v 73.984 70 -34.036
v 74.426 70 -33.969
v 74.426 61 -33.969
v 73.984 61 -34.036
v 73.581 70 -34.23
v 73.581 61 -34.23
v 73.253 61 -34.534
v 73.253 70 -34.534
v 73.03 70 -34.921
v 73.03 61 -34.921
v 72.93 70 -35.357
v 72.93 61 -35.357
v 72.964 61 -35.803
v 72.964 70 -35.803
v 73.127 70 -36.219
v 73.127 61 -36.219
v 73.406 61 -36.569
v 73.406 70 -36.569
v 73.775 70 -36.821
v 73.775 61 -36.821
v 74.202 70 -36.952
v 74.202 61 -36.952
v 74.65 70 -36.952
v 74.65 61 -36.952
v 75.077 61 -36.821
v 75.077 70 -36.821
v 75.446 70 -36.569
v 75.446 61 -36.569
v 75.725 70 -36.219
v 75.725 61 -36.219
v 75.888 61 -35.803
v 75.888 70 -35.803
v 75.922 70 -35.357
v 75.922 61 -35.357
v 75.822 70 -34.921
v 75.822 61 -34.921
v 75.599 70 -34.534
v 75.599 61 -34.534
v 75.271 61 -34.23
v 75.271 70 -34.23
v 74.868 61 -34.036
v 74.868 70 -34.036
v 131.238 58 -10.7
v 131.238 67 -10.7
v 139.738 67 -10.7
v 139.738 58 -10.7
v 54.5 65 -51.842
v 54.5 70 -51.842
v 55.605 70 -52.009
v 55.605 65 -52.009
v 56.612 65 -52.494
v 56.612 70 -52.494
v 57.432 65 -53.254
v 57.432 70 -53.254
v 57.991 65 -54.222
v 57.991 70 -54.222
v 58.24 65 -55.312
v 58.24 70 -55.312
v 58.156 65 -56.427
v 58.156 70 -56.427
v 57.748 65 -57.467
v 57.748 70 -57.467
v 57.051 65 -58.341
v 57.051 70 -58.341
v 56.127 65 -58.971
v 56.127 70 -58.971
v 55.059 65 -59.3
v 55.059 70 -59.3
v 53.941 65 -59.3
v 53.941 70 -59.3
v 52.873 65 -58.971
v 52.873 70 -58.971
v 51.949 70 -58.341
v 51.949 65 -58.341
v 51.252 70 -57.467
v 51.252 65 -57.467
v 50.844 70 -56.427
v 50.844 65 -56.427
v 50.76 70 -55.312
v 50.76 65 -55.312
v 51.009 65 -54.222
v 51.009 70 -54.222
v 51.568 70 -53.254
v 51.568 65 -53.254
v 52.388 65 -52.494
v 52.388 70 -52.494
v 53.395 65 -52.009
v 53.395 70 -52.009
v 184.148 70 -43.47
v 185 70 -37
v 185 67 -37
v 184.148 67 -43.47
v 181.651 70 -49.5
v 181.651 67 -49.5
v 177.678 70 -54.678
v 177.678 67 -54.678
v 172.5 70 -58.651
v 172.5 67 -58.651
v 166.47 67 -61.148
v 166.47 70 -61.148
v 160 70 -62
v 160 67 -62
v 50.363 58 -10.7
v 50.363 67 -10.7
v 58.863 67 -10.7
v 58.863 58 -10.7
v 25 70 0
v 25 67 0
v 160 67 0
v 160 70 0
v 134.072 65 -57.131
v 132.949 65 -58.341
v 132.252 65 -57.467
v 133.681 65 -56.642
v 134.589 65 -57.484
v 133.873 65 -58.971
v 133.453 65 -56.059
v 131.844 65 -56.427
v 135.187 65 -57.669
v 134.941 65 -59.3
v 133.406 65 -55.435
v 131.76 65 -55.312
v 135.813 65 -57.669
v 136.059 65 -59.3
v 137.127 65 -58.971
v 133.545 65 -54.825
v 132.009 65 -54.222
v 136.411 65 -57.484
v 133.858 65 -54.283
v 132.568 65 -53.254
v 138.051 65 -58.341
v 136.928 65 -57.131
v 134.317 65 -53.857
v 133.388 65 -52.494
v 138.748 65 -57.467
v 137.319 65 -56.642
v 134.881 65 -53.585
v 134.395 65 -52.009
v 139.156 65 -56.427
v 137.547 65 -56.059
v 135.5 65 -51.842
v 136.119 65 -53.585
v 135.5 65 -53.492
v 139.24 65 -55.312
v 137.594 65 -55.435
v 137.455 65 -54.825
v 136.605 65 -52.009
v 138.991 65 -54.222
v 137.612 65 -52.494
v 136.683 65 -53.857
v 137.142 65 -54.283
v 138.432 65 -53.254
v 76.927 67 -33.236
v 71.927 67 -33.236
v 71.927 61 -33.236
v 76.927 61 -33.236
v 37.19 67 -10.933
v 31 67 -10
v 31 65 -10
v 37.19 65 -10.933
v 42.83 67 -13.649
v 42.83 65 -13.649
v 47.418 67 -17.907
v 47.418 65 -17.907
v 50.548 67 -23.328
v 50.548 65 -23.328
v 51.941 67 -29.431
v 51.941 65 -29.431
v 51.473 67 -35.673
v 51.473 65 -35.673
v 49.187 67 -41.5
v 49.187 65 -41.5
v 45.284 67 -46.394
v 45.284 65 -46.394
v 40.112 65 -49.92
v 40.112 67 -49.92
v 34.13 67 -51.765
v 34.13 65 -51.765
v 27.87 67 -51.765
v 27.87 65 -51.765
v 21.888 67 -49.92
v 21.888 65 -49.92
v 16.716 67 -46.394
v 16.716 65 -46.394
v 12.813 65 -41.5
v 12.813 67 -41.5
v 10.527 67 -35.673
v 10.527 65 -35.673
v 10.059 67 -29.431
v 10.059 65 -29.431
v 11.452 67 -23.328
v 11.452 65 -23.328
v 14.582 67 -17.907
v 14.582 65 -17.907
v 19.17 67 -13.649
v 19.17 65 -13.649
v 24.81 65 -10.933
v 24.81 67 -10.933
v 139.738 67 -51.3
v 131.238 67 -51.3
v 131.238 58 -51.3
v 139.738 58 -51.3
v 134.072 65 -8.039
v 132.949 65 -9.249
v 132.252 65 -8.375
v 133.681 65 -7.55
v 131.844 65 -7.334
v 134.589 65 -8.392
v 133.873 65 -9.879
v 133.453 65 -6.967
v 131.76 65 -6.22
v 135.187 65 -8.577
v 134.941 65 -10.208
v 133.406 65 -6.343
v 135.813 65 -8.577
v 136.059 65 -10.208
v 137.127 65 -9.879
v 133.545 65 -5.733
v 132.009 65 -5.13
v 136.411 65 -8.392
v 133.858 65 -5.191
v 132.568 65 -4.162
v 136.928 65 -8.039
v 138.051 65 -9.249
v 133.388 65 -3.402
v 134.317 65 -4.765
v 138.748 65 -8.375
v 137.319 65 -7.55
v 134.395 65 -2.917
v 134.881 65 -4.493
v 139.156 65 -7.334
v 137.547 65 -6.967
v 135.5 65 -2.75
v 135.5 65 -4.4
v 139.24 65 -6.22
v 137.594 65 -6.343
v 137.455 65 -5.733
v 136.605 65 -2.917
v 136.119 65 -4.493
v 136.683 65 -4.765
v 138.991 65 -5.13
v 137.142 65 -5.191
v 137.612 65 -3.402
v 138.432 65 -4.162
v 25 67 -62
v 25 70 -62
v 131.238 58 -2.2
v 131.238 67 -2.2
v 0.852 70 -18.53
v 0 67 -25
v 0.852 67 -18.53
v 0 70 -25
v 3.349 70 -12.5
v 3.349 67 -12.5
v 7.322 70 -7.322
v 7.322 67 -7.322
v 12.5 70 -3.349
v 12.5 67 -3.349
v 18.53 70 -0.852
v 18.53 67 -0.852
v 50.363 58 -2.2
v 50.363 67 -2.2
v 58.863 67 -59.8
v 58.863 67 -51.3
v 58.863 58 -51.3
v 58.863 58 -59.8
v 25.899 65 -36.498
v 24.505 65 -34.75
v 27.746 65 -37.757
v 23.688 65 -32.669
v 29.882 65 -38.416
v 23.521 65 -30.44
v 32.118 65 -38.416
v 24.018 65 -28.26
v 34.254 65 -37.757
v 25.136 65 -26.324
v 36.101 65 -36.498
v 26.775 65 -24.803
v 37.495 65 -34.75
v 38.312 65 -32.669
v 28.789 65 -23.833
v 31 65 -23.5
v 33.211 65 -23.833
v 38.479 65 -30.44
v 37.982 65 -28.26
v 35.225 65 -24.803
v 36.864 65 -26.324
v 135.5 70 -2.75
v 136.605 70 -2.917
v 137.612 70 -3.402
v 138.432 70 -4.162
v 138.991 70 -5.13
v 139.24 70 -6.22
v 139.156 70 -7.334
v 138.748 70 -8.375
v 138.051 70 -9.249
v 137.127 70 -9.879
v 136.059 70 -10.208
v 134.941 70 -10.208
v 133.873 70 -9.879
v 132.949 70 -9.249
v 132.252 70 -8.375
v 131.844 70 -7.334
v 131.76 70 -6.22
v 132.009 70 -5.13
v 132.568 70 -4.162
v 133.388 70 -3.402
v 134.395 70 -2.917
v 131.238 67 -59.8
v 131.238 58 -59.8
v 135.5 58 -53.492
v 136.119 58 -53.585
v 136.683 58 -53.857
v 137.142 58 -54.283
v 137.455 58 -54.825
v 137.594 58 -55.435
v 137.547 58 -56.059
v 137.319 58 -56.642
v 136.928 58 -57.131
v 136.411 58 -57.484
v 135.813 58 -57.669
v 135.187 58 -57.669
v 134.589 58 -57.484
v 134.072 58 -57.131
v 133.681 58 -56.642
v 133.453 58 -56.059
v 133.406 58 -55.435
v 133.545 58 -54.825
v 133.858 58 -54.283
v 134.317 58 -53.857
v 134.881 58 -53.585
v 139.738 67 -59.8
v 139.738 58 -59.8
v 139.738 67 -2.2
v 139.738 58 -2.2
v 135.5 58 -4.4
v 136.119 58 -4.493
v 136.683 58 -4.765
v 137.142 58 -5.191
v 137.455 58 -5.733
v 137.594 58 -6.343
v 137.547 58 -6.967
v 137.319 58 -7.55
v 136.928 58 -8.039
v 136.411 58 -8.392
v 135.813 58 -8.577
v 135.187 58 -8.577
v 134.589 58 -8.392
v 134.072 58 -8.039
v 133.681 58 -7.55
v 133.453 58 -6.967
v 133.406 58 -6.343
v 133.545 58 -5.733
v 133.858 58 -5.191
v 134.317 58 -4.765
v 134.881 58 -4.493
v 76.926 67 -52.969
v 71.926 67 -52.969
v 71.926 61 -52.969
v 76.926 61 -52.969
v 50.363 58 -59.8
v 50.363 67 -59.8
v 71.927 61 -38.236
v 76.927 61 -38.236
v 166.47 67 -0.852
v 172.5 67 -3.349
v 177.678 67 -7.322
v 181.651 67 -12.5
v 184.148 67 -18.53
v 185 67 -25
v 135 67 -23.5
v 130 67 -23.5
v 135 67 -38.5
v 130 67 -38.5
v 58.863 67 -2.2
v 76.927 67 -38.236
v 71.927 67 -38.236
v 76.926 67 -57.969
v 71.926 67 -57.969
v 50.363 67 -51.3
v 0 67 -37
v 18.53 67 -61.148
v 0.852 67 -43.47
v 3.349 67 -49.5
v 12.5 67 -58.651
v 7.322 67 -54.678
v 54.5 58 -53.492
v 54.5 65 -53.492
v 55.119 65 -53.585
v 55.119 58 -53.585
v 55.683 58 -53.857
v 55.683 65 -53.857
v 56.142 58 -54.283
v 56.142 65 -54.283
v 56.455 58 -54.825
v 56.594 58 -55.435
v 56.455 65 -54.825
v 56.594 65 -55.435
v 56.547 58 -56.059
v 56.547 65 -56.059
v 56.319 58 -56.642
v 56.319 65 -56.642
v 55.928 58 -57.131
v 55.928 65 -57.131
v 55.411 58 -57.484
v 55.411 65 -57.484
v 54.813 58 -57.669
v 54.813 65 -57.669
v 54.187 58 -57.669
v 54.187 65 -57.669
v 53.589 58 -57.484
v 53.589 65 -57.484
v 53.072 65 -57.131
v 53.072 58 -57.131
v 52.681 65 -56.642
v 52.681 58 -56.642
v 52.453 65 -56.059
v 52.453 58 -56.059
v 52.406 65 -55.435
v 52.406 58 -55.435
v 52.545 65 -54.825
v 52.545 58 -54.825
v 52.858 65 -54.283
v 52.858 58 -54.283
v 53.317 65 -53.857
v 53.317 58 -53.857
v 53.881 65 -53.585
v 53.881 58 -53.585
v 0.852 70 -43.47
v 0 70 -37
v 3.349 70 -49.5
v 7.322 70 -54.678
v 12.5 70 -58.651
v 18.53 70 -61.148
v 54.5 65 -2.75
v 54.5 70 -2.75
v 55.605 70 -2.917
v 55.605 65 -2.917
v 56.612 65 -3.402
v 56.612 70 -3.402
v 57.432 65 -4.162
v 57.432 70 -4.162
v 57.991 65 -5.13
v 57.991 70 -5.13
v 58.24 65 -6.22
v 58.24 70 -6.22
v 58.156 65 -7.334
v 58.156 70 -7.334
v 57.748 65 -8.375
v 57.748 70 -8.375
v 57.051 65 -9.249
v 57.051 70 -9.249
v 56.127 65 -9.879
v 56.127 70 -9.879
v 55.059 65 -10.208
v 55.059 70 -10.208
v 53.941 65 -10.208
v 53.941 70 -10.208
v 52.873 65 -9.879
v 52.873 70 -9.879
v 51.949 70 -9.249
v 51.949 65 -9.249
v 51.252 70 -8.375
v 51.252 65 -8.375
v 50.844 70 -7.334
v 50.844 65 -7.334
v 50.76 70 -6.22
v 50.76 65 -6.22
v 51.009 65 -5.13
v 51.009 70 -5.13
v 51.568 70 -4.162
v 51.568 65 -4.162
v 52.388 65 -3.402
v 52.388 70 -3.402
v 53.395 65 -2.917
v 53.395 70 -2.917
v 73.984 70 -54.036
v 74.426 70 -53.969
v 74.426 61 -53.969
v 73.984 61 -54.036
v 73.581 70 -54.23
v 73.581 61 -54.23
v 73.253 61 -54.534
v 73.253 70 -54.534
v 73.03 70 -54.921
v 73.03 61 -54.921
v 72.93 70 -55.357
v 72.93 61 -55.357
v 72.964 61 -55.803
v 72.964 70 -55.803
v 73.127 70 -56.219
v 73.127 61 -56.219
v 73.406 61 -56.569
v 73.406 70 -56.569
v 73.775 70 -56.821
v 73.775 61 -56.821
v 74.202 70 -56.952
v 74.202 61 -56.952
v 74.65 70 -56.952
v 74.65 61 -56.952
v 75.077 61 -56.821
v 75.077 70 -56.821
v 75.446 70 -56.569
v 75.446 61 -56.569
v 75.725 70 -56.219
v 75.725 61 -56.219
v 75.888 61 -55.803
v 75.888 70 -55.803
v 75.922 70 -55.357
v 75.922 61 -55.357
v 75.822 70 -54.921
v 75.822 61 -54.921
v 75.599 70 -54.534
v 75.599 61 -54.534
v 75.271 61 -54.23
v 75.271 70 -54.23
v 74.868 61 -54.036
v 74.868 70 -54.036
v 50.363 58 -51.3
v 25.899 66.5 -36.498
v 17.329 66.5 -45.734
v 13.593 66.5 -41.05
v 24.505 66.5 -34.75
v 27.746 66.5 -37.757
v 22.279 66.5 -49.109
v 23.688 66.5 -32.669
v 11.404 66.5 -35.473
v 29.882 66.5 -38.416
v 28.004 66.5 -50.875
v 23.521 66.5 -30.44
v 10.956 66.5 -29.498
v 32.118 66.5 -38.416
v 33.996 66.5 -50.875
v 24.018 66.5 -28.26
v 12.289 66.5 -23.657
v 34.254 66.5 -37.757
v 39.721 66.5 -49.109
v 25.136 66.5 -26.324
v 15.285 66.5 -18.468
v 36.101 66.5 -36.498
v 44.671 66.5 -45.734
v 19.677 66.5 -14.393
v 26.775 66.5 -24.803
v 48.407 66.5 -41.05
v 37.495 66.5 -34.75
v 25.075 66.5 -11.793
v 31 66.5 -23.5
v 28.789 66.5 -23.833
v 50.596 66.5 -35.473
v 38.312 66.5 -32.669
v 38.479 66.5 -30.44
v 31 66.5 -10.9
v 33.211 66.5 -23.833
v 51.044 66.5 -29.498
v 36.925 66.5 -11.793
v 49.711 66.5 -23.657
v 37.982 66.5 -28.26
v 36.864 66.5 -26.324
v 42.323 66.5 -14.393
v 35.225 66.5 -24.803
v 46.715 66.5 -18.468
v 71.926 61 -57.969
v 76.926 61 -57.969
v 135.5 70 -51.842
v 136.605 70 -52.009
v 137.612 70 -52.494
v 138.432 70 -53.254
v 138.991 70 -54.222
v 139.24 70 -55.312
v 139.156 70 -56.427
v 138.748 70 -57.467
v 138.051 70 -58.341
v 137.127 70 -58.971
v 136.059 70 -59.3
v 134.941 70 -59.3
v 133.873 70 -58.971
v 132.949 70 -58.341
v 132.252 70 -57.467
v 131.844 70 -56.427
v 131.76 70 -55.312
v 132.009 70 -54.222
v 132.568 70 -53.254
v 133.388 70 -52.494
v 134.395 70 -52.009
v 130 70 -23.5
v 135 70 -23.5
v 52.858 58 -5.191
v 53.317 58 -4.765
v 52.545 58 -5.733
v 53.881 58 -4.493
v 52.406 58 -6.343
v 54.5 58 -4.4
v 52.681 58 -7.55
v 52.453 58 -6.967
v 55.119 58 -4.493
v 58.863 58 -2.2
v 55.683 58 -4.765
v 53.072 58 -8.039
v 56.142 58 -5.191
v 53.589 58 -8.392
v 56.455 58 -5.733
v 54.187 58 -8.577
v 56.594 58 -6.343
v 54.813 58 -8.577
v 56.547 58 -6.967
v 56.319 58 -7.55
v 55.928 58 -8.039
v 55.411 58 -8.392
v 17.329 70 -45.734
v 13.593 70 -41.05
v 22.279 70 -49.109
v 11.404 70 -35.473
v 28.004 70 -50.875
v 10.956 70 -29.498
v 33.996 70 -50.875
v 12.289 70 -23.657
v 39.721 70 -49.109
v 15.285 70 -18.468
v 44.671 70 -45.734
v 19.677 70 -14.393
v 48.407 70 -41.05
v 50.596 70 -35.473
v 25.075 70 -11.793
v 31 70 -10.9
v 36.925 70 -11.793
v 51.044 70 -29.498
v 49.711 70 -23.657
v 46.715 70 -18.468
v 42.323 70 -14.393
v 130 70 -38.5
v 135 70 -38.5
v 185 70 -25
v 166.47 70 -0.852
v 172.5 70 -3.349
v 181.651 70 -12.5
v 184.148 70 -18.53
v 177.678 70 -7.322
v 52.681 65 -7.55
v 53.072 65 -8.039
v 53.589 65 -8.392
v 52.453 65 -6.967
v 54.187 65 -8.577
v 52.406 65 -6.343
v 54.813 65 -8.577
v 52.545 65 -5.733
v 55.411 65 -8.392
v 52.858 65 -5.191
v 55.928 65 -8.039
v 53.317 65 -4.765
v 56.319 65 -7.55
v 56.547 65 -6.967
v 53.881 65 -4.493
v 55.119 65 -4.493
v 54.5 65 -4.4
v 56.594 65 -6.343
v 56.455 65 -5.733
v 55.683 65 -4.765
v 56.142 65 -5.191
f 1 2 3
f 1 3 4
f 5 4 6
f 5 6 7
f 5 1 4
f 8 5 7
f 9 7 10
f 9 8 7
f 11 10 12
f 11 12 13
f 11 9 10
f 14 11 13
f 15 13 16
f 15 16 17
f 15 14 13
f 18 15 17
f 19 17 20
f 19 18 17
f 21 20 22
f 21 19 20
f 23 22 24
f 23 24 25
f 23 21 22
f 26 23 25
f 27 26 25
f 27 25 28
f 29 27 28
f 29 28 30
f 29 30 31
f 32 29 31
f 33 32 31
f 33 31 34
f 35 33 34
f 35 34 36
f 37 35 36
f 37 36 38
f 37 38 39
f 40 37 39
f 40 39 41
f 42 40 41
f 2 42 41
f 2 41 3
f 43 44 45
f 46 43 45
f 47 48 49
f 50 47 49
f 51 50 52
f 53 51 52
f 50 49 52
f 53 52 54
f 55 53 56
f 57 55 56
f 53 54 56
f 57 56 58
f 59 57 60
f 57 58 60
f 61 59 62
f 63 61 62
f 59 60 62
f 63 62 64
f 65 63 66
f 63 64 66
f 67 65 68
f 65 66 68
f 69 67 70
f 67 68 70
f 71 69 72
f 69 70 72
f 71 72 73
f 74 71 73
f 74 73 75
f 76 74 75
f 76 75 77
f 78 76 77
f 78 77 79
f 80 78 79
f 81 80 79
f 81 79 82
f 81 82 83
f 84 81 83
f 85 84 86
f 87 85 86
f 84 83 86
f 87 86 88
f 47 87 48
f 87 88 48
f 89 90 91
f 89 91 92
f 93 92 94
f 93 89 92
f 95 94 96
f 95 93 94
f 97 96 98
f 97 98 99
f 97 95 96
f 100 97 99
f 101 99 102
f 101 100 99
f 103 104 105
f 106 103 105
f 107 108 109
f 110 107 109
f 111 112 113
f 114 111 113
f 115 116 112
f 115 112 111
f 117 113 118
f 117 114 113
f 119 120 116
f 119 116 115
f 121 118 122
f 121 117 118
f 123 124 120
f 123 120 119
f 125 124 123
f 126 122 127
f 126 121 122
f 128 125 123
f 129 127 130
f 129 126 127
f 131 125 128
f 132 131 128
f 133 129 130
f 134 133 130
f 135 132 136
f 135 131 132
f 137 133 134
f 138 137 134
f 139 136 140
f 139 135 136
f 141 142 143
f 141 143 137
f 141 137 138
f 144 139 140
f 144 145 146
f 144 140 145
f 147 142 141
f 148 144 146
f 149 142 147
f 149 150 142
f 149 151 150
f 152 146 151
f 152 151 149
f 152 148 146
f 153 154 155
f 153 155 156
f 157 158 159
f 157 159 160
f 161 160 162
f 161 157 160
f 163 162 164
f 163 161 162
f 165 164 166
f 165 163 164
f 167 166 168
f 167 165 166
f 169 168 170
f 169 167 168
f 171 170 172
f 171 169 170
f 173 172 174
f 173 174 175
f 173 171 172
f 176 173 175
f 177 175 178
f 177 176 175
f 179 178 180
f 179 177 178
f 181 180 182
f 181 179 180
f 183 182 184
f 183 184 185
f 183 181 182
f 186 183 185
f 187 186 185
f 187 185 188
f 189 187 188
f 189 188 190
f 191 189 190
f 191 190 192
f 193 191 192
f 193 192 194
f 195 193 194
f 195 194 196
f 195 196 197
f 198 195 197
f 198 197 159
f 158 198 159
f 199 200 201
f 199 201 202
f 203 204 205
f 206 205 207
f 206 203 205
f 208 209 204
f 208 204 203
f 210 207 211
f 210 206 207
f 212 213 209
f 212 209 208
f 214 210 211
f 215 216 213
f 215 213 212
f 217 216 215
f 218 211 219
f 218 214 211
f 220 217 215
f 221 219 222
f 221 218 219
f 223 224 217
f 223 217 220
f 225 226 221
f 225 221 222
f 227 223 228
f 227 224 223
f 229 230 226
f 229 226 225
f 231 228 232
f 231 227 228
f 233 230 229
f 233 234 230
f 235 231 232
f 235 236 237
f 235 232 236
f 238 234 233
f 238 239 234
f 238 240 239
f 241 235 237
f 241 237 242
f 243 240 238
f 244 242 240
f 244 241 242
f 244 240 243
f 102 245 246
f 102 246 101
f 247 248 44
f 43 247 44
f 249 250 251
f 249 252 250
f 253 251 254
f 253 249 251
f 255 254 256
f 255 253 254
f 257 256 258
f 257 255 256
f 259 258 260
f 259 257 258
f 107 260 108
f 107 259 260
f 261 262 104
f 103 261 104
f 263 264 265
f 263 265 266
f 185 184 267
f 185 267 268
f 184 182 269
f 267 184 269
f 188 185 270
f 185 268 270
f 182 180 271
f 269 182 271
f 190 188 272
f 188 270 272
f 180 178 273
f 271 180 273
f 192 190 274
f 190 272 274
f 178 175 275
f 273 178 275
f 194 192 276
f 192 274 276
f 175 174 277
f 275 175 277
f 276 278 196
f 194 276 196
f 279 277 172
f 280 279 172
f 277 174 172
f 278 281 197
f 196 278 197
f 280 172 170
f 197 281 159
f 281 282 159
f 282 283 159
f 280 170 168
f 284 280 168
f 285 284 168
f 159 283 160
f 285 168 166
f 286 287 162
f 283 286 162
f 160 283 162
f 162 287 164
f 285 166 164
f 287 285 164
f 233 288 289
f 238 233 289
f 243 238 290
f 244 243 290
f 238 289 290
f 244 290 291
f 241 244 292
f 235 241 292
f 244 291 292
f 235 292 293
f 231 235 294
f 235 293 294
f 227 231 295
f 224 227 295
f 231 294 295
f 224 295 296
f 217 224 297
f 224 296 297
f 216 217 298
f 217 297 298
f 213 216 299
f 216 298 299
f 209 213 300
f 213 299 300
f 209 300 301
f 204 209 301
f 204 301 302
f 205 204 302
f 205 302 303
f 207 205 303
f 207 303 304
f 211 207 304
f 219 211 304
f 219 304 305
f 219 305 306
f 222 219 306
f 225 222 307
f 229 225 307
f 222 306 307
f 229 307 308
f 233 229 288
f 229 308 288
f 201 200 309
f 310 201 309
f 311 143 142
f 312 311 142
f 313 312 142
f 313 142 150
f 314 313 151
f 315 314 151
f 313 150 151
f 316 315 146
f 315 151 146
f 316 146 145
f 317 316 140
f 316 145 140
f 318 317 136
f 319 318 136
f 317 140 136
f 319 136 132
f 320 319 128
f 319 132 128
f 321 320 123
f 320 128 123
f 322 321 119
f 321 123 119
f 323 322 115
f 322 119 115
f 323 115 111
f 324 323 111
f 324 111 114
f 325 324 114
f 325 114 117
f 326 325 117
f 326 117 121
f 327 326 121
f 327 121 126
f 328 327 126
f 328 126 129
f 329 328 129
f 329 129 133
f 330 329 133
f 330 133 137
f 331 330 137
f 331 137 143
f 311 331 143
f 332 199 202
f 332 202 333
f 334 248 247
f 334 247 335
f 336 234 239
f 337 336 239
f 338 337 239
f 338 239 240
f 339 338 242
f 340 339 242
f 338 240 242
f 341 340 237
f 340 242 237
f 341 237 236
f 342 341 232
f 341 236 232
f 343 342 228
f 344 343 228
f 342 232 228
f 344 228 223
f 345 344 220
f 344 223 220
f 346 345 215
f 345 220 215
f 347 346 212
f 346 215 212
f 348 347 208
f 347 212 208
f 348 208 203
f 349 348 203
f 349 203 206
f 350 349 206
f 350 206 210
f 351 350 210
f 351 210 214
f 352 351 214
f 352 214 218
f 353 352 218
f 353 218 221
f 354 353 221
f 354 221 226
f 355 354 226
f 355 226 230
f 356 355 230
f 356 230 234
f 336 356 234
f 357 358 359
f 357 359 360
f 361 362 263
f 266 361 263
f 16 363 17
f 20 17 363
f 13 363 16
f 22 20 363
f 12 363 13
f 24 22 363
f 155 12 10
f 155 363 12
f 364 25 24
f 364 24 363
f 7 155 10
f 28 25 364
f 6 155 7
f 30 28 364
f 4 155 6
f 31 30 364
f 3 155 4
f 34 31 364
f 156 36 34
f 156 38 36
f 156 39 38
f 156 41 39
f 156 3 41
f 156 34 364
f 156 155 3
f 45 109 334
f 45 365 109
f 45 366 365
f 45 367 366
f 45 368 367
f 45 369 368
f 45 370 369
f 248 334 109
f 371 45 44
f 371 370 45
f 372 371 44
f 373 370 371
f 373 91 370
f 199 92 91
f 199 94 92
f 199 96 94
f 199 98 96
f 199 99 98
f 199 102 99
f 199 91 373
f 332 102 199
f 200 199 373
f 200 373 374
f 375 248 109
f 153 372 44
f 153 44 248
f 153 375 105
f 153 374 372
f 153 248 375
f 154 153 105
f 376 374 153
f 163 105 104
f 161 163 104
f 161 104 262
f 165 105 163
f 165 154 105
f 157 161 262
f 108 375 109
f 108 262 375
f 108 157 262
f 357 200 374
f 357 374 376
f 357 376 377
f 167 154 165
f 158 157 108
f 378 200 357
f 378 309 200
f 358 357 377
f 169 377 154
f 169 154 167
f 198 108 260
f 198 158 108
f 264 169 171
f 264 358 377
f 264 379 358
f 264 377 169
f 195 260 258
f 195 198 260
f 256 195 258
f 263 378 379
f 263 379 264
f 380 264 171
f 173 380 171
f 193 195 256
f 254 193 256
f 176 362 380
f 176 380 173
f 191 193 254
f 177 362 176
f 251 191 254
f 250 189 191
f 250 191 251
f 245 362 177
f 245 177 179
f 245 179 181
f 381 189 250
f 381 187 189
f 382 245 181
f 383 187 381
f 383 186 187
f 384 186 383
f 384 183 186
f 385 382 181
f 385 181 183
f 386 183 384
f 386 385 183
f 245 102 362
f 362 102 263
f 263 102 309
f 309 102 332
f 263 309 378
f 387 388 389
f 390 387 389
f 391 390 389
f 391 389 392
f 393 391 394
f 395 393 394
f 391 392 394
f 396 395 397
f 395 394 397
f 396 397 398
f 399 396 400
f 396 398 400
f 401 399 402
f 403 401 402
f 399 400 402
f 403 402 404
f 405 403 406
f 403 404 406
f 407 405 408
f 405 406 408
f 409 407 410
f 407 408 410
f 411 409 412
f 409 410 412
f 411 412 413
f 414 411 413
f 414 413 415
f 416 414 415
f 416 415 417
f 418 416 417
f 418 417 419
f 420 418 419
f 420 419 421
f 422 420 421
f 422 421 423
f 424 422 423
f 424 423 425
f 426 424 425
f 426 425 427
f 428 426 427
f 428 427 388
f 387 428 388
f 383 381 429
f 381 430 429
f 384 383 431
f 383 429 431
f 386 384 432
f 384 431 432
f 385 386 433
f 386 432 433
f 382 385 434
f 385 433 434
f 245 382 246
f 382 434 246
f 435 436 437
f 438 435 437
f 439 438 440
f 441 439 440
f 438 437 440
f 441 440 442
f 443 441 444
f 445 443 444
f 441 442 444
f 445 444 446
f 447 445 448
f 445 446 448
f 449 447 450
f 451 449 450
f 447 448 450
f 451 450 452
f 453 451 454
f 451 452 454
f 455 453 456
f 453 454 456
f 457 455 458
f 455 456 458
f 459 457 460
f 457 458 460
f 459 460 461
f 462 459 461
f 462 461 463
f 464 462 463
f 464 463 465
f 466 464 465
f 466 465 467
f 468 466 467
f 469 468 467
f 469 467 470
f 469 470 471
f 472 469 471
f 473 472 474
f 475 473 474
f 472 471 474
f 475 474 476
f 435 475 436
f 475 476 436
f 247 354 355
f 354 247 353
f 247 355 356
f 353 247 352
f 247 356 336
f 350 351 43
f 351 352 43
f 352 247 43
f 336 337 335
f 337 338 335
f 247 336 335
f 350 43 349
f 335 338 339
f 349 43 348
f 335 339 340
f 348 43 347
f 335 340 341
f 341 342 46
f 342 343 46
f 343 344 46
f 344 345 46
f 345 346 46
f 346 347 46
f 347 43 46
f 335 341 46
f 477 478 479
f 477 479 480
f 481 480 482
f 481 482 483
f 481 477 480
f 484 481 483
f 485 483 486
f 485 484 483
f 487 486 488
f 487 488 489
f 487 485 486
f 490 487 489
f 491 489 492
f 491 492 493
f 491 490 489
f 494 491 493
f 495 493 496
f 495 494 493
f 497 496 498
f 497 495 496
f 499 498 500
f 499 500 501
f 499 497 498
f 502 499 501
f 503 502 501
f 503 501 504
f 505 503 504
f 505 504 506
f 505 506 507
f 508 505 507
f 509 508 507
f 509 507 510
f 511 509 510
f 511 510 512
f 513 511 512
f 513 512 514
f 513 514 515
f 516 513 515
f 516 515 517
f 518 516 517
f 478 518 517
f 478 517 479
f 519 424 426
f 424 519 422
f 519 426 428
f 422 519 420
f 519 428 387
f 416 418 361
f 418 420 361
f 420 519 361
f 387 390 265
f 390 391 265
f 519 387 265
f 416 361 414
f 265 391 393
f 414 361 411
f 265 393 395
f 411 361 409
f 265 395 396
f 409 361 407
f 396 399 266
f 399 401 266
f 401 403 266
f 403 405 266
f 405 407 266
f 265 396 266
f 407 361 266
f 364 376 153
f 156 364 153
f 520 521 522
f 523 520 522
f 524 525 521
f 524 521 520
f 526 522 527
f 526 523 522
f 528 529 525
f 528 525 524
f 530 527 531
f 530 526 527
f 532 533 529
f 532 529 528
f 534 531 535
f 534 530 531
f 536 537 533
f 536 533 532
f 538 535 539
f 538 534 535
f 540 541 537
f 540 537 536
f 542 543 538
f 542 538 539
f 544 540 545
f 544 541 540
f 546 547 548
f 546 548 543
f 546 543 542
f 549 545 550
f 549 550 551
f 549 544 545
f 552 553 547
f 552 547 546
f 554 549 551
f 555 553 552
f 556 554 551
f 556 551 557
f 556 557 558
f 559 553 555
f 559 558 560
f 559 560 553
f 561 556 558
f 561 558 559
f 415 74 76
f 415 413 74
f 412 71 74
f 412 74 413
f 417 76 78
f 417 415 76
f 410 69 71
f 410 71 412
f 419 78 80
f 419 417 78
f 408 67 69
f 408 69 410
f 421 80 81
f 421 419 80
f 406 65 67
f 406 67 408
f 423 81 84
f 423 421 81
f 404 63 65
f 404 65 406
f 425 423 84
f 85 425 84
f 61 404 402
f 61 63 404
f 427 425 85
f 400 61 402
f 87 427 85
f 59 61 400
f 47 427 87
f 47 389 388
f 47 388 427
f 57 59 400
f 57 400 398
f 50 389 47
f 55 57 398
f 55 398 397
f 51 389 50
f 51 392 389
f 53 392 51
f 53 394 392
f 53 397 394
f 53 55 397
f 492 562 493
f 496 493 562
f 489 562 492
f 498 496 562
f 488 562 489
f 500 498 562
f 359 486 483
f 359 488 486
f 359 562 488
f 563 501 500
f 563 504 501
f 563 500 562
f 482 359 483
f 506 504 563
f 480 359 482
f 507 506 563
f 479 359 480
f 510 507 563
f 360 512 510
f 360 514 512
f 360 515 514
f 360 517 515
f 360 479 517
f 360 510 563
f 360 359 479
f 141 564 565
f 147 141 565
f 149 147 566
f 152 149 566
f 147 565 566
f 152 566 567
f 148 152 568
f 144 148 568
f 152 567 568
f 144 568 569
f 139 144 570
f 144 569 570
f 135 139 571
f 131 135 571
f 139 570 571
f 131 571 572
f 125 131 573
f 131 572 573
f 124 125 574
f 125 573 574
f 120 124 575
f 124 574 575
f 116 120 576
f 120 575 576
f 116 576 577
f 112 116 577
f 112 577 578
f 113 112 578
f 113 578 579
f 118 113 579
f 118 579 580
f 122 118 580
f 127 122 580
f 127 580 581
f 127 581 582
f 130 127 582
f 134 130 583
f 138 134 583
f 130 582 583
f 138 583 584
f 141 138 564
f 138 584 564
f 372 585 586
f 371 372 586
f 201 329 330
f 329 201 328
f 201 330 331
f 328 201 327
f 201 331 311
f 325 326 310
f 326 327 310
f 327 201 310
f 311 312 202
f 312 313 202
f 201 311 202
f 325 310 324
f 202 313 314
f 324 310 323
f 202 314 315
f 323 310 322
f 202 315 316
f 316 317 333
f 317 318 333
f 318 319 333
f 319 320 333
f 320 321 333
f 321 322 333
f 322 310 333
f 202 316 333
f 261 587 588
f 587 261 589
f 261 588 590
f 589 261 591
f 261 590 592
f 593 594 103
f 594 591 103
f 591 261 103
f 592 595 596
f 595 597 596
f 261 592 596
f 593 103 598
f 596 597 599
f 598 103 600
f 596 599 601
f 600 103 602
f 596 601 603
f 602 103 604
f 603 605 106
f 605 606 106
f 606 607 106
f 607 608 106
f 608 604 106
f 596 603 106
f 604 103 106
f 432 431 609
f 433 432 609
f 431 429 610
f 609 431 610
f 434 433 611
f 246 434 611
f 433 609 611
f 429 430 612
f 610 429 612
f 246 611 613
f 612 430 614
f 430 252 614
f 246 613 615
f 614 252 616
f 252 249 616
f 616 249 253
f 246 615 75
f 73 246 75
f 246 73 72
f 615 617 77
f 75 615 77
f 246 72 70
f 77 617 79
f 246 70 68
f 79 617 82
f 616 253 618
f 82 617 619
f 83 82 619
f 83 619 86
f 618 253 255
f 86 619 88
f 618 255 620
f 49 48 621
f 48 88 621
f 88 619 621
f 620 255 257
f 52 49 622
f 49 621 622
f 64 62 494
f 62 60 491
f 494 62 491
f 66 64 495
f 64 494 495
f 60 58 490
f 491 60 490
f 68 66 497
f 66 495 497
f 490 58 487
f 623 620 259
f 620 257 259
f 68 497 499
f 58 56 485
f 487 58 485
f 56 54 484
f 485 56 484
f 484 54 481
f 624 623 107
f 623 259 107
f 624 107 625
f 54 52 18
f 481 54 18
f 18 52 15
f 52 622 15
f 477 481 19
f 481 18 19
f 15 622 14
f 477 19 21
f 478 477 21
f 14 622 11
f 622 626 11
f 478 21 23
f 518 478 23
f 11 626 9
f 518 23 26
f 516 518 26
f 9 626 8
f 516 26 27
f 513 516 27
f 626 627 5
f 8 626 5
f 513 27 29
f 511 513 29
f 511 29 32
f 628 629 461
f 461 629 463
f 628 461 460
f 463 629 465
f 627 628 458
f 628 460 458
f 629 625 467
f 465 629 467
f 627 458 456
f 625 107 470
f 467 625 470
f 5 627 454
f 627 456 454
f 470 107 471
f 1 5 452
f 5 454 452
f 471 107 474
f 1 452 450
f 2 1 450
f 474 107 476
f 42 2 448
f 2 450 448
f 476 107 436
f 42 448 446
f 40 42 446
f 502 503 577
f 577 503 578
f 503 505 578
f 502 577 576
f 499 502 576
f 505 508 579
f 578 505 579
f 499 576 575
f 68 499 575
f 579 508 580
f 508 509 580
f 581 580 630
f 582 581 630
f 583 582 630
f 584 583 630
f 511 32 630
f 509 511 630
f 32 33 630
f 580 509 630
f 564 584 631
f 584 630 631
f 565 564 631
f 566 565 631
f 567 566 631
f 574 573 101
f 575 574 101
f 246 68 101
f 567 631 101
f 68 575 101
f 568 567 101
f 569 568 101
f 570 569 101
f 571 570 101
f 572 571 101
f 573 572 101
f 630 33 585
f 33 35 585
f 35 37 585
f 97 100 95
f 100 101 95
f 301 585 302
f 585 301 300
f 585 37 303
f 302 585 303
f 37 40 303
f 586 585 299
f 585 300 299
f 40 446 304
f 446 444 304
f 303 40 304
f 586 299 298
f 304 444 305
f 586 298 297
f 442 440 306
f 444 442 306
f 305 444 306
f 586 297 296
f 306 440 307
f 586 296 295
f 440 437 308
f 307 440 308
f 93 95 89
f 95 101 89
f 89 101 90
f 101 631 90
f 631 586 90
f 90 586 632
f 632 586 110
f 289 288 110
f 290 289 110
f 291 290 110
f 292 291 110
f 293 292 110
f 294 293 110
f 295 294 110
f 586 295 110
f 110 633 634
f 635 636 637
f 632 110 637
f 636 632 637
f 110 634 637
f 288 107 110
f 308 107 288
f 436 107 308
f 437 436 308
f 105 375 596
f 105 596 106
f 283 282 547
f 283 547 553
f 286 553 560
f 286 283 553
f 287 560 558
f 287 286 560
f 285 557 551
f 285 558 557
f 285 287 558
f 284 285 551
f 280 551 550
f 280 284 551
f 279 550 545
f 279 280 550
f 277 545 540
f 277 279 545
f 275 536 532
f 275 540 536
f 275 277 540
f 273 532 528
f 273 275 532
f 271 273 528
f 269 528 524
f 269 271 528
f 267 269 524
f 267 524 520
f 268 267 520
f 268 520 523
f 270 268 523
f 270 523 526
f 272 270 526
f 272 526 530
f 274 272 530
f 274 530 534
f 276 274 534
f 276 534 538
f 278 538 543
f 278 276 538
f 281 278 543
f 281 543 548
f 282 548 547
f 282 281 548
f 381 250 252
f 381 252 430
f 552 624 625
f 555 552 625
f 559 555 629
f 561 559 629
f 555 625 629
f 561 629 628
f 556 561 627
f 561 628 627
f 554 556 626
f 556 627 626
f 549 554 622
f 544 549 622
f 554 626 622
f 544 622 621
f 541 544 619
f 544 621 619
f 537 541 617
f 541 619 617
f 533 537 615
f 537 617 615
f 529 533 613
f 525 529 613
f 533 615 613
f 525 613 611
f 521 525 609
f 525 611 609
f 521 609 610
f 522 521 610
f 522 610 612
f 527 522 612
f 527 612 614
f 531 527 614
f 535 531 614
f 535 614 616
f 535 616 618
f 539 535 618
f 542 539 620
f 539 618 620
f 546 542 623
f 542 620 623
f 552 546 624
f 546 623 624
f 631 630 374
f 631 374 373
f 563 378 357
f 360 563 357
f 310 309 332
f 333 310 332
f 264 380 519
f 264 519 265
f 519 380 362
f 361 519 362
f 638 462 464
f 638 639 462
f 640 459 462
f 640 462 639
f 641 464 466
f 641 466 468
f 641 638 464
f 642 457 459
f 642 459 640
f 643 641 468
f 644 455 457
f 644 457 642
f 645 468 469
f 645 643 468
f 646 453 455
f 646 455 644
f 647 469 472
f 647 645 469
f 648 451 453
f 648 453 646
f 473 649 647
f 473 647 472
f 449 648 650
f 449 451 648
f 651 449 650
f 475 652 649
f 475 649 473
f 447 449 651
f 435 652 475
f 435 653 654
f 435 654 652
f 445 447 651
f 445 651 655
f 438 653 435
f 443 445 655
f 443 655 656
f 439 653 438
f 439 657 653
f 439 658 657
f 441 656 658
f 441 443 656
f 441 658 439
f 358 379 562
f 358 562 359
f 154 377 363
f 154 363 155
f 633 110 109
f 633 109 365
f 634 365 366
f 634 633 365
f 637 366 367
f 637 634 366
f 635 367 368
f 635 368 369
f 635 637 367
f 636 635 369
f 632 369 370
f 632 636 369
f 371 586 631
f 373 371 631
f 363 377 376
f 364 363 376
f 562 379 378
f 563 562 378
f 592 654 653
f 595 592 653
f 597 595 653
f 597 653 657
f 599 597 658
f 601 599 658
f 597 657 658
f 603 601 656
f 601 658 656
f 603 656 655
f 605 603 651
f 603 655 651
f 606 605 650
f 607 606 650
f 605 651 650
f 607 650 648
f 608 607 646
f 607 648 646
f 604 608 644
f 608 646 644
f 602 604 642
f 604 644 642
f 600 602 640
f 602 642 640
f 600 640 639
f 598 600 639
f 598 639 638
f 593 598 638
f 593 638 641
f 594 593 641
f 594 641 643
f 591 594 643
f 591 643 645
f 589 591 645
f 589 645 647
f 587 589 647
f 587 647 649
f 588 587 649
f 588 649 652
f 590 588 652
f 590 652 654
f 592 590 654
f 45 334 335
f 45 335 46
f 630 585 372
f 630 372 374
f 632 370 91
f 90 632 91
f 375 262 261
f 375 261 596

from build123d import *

# Parameters (mm, degrees)
SKETCH1_W                = 185
SKETCH1_H                = 62
BOSS_EXTRUDE1_DEPTH      = 70
FILLET1_R                = 25
CUT_EXTRUDE6_DEPTH       = 64
SKETCH11_R               = 25
CUT_EXTRUDE9_DEPTH       = 17
SKETCH16_R               = 21
BOSS_EXTRUDE6_DEPTH      = 5
SKETCH17_R               = 20.1
CUT_EXTRUDE12_DEPTH      = 3.5
SKETCH20_R               = 25
CUT_EXTRUDE14_DEPTH      = 5.5
SKETCH25_W               = 40
SKETCH25_H               = 8
CUT_EXTRUDE16_DEPTH      = 14
CUT_EXTRUDE21_DEPTH      = 0.1
SKETCH28_R               = 25
BOSS_EXTRUDE10_DEPTH     = 1
SKETCH29_W               = 5
SKETCH29_H               = 15
CUT_EXTRUDE22_DEPTH      = 5
CUT_EXTRUDE24_DEPTH      = 73
CUT_EXTRUDE24_DEPTH_BACK = 44
SKETCH28_2_R             = 25
SKETCH33_OUTSIDE_W       = 226.368
SKETCH33_OUTSIDE_H       = 103.368
CUT_EXTRUDE25_DEPTH      = 23
SKETCH35_W               = 8.5
SKETCH35_H               = 8.5
SKETCH35_R               = 3.75
SKETCH35_R_2             = 2.1
BOSS_EXTRUDE16_DEPTH     = 12
CUT_EXTRUDE13_DEPTH      = 196.481456921
CUT_EXTRUDE13_DEPTH_BACK = 196.481456921
SKETCH18_R               = 7.5
SKETCH35_5_R             = 3.75
SKETCH35_5_R_2           = 2.1
CUT_EXTRUDE36_DEPTH      = 5
CUT_EXTRUDE37_DEPTH      = 196.481456921
CUT_EXTRUDE37_DEPTH_BACK = 196.481456921
SKETCH35_6_R             = 2.1
SKETCH36_W               = 5
SKETCH36_H               = 5
SKETCH36_R               = 1.5
BOSS_EXTRUDE17_DEPTH     = 9
SKETCH36_5_R             = 1.5
CUT_EXTRUDE38_DEPTH      = 9


with BuildPart() as part:
    # Sketch1 → Boss-Extrude1 (new body)
    with BuildSketch(Plane(origin=(0, 0, 0), x_dir=(1, 0, 0), z_dir=(0, 1, 0))):
        with Locations((92.5, 31)):
            Rectangle(SKETCH1_W, SKETCH1_H)
    extrude(amount=BOSS_EXTRUDE1_DEPTH)

    # Fillet1
    fillet1_edges = [part.edges().sort_by_distance(p)[0] for p in [
        (0, 35, -62),
        (185, 35, -62),
        (185, 35, 0),
        (0, 35, 0),
    ]]
    fillet(fillet1_edges, radius=FILLET1_R)

    # Sketch7 → Cut-Extrude6 (cut)
    with BuildSketch(Plane(origin=(0, 67, 0), x_dir=(1, 0, 0), z_dir=(0, 1, 0))):
        with BuildLine():
            Line((25, 58), (160, 58))
            ThreePointArc((160, 58), (174.849242405, 51.849242405), (181, 37))
            Line((181, 37), (181, 25))
            ThreePointArc((181, 25), (174.849242405, 10.150757595), (160, 4))
            Line((160, 4), (25, 4))
            ThreePointArc((25, 4), (10.150757595, 10.150757595), (4, 25))
            Line((4, 25), (4, 37))
            ThreePointArc((4, 37), (10.150757595, 51.849242405), (25, 58))
        make_face()
    extrude(amount=-CUT_EXTRUDE6_DEPTH, mode=Mode.SUBTRACT)

    # Sketch11 → Cut-Extrude9 (cut)
    with BuildSketch(Plane.XZ):
        with Locations(Location((154, -31, 0), (0, 0, 270))):
            Circle(SKETCH11_R)
    extrude(amount=-CUT_EXTRUDE9_DEPTH, mode=Mode.SUBTRACT)

    # Sketch16 → Boss-Extrude6 (add)
    with BuildSketch(Plane(origin=(0, 70, 0), x_dir=(1, 0, 0), z_dir=(0, 1, 0))):
        with Locations(Location((31, 31, 0), (0, 0, 270))):
            Circle(SKETCH16_R)
    extrude(amount=-BOSS_EXTRUDE6_DEPTH)

    # Sketch17 → Cut-Extrude12 (cut)
    with BuildSketch(Plane(origin=(0, 70, 0), x_dir=(1, 0, 0), z_dir=(0, 1, 0))):
        with Locations(Location((31, 31, 0), (0, 0, 270))):
            Circle(SKETCH17_R)
    extrude(amount=-CUT_EXTRUDE12_DEPTH, mode=Mode.SUBTRACT)

    # Sketch20 → Cut-Extrude14 (cut)
    with BuildSketch(Plane.XZ):
        with Locations(Location((31, -31, 0), (0, 0, 270))):
            Circle(SKETCH20_R)
    extrude(amount=-CUT_EXTRUDE14_DEPTH, mode=Mode.SUBTRACT)

    # Sketch25 → Cut-Extrude16 (cut)
    with BuildSketch(Plane.ZY):
        with Locations((-31, 35)):
            Rectangle(SKETCH25_W, SKETCH25_H)
    extrude(amount=-CUT_EXTRUDE16_DEPTH, mode=Mode.SUBTRACT)

    # Sketch27 → Cut-Extrude21 (cut)
    with BuildSketch(Plane(origin=(0, 67, 0), x_dir=(1, 0, 0), z_dir=(0, 1, 0))):
        with BuildLine():
            Line((31, 73.5576089), (197.227071292, 73.5576089))
            ThreePointArc((197.227071292, 73.5576089), (239.784680192, 31), (197.227071292, -11.5576089))
            Line((197.227071292, -11.5576089), (31, -11.5576089))
            ThreePointArc((31, -11.5576089), (-11.5576089, 31), (31, 73.5576089))
        make_face()
        with BuildLine():
            Line((4.02, 37), (4.02, 25))
            ThreePointArc((4.02, 25), (10.164899731, 10.164899731), (25, 4.02))
            Line((25, 4.02), (160, 4.02))
            ThreePointArc((160, 4.02), (174.835100269, 10.164899731), (180.98, 25))
            Line((180.98, 25), (180.98, 37))
            ThreePointArc((180.98, 37), (174.835100269, 51.835100269), (160, 57.98))
            Line((160, 57.98), (25, 57.98))
            ThreePointArc((25, 57.98), (10.164899731, 51.835100269), (4.02, 37))
        make_face(mode=Mode.SUBTRACT)
    extrude(amount=-CUT_EXTRUDE21_DEPTH, mode=Mode.SUBTRACT)


with BuildPart() as cut_extrude21_piece_1:
    # of the separate pieces the step leaves, piece 1, a body of its own (cut_extrude21_pieces)
    add(part.part.solids().sort_by_distance((25, 0, 0))[0])

    # Sketch28 → Boss-Extrude10 (add)
    with BuildSketch(Plane.XZ):
        with BuildLine():
            Line((25, 0), (160, 0))
            ThreePointArc((160, 0), (177.67766953, -7.32233047), (185, -25))
            Line((185, -25), (185, -37))
            ThreePointArc((185, -37), (177.67766953, -54.67766953), (160, -62))
            Line((160, -62), (25, -62))
            ThreePointArc((25, -62), (7.32233047, -54.67766953), (0, -37))
            Line((0, -37), (0, -25))
            ThreePointArc((0, -25), (7.32233047, -7.32233047), (25, 0))
        make_face()
        with Locations(Location((31, -31, 0), (0, 0, 270))):
            Circle(SKETCH28_R, mode=Mode.SUBTRACT)
        with Locations(Location((154, -31, 0), (0, 0, 270))):
            Circle(SKETCH28_R, mode=Mode.SUBTRACT)
    extrude(amount=BOSS_EXTRUDE10_DEPTH)

    # Sketch28<2> → Cut-Extrude24 (cut, two sides: drawn at the far end of the back side and taken through both)
    with BuildSketch(Plane.XZ.offset(-CUT_EXTRUDE24_DEPTH_BACK)):
        with BuildLine():
            Line((25, 0), (160, 0))
            ThreePointArc((160, 0), (177.67766953, -7.32233047), (185, -25))
            Line((185, -25), (185, -37))
            ThreePointArc((185, -37), (177.67766953, -54.67766953), (160, -62))
            Line((160, -62), (25, -62))
            ThreePointArc((25, -62), (7.32233047, -54.67766953), (0, -37))
            Line((0, -37), (0, -25))
            ThreePointArc((0, -25), (7.32233047, -7.32233047), (25, 0))
        make_face()
        with Locations((31, -31)):
            Circle(SKETCH28_2_R, mode=Mode.SUBTRACT)
        with Locations((154, -31)):
            Circle(SKETCH28_2_R, mode=Mode.SUBTRACT)
    extrude(amount=CUT_EXTRUDE24_DEPTH + CUT_EXTRUDE24_DEPTH_BACK, mode=Mode.SUBTRACT)

    # Sketch33 outside → Cut-Extrude25 (cut)
    with BuildSketch(Plane.XZ.offset(-44)):
        with Locations((92.5, -31)):
            Rectangle(SKETCH33_OUTSIDE_W, SKETCH33_OUTSIDE_H)
        with BuildLine():
            Line((25, -4), (160, -4))
            ThreePointArc((160, -4), (174.849242405, -10.150757595), (181, -25))
            Line((181, -25), (181, -37))
            ThreePointArc((181, -37), (174.849242405, -51.849242405), (160, -58))
            Line((160, -58), (25, -58))
            ThreePointArc((25, -58), (10.150757595, -51.849242405), (4, -37))
            Line((4, -37), (4, -25))
            ThreePointArc((4, -25), (10.150757595, -10.150757595), (25, -4))
        make_face(mode=Mode.SUBTRACT)
    extrude(amount=-CUT_EXTRUDE25_DEPTH, mode=Mode.SUBTRACT)


with BuildPart() as cut_extrude21_piece_2:
    # of the separate pieces the step leaves, piece 2, a body of its own (cut_extrude21_pieces)
    add(part.part.solids().sort_by_distance((160, 67, 0))[0])

    # Sketch29 → Cut-Extrude22 (cut)
    with BuildSketch(Plane(origin=(0, 70, 0), x_dir=(1, 0, 0), z_dir=(0, 1, 0))):
        with Locations((132.5, 31)):
            Rectangle(SKETCH29_W, SKETCH29_H)
    extrude(amount=-CUT_EXTRUDE22_DEPTH, mode=Mode.SUBTRACT)

    # Sketch35 → Boss-Extrude16 (add)
    # profile 1 of 8: a face of its own
    with BuildSketch(Plane(origin=(0, 70, 0), x_dir=(1, 0, 0), z_dir=(0, 1, 0))):
        with Locations((54.613267141, 55.55)):
            Rectangle(SKETCH35_W, SKETCH35_H)
        with Locations((54.5, 55.592077299)):
            Circle(SKETCH35_R, mode=Mode.SUBTRACT)
    # profile 2 of 8: a face of its own
    with BuildSketch(Plane(origin=(0, 70, 0), x_dir=(1, 0, 0), z_dir=(0, 1, 0))):
        with Locations((54.5, 55.592077299)):
            Circle(SKETCH35_R)
        with Locations(Location((54.5, 55.592077299, 0), (0, 0, 270))):
            Circle(SKETCH35_R_2, mode=Mode.SUBTRACT)
    # profile 3 of 8: a face of its own
    with BuildSketch(Plane(origin=(0, 70, 0), x_dir=(1, 0, 0), z_dir=(0, 1, 0))):
        with Locations((54.613267141, 6.45)):
            Rectangle(SKETCH35_W, SKETCH35_H)
        with Locations((54.5, 6.5)):
            Circle(SKETCH35_R, mode=Mode.SUBTRACT)
    # profile 4 of 8: a face of its own
    with BuildSketch(Plane(origin=(0, 70, 0), x_dir=(1, 0, 0), z_dir=(0, 1, 0))):
        with Locations((54.5, 6.5)):
            Circle(SKETCH35_R)
        with Locations(Location((54.5, 6.5, 0), (0, 0, 270))):
            Circle(SKETCH35_R_2, mode=Mode.SUBTRACT)
    # profile 5 of 8: a face of its own
    with BuildSketch(Plane(origin=(0, 70, 0), x_dir=(1, 0, 0), z_dir=(0, 1, 0))):
        with Locations((135.488094084, 6.45)):
            Rectangle(SKETCH35_W, SKETCH35_H)
        with Locations((135.5, 6.5)):
            Circle(SKETCH35_R, mode=Mode.SUBTRACT)
    # profile 6 of 8: a face of its own
    with BuildSketch(Plane(origin=(0, 70, 0), x_dir=(1, 0, 0), z_dir=(0, 1, 0))):
        with Locations((135.5, 6.5)):
            Circle(SKETCH35_R)
        with Locations(Location((135.5, 6.5, 0), (0, 0, 270))):
            Circle(SKETCH35_R_2, mode=Mode.SUBTRACT)
    # profile 7 of 8: a face of its own
    with BuildSketch(Plane(origin=(0, 70, 0), x_dir=(1, 0, 0), z_dir=(0, 1, 0))):
        with Locations((135.488094084, 55.55)):
            Rectangle(SKETCH35_W, SKETCH35_H)
        with Locations((135.5, 55.592077299)):
            Circle(SKETCH35_R, mode=Mode.SUBTRACT)
    # profile 8 of 8: a face of its own
    with BuildSketch(Plane(origin=(0, 70, 0), x_dir=(1, 0, 0), z_dir=(0, 1, 0))):
        with Locations((135.5, 55.592077299)):
            Circle(SKETCH35_R)
        with Locations(Location((135.5, 55.592077299, 0), (0, 0, 270))):
            Circle(SKETCH35_R_2, mode=Mode.SUBTRACT)
    extrude(amount=-BOSS_EXTRUDE16_DEPTH)

    # Sketch18 → Cut-Extrude13 (cut, two sides: drawn at the far end of the back side and taken through both)
    with BuildSketch(Plane(origin=(0, 70, 0), x_dir=(1, 0, 0), z_dir=(0, 1, 0)).offset(-CUT_EXTRUDE13_DEPTH_BACK)):
        with Locations(Location((31, 31, 0), (0, 0, 270))):
            Circle(SKETCH18_R)
    extrude(amount=CUT_EXTRUDE13_DEPTH + CUT_EXTRUDE13_DEPTH_BACK, mode=Mode.SUBTRACT)

    # Sketch35<5> → Cut-Extrude36 (cut)
    # profile 1 of 4: a face of its own
    with BuildSketch(Plane(origin=(0, 70, 0), x_dir=(1, 0, 0), z_dir=(0, 1, 0))):
        with Locations(Location((54.5, 6.5, 0), (0, 0, 270))):
            Circle(SKETCH35_5_R)
        with Locations(Location((54.5, 6.5, 0), (0, 0, 270))):
            Circle(SKETCH35_5_R_2, mode=Mode.SUBTRACT)
    # profile 2 of 4: a face of its own
    with BuildSketch(Plane(origin=(0, 70, 0), x_dir=(1, 0, 0), z_dir=(0, 1, 0))):
        with Locations(Location((54.5, 55.592077299, 0), (0, 0, 270))):
            Circle(SKETCH35_5_R)
        with Locations(Location((54.5, 55.592077299, 0), (0, 0, 270))):
            Circle(SKETCH35_5_R_2, mode=Mode.SUBTRACT)
    # profile 3 of 4: a face of its own
    with BuildSketch(Plane(origin=(0, 70, 0), x_dir=(1, 0, 0), z_dir=(0, 1, 0))):
        with Locations(Location((135.5, 55.592077299, 0), (0, 0, 270))):
            Circle(SKETCH35_5_R)
        with Locations(Location((135.5, 55.592077299, 0), (0, 0, 270))):
            Circle(SKETCH35_5_R_2, mode=Mode.SUBTRACT)
    # profile 4 of 4: a face of its own
    with BuildSketch(Plane(origin=(0, 70, 0), x_dir=(1, 0, 0), z_dir=(0, 1, 0))):
        with Locations(Location((135.5, 6.5, 0), (0, 0, 270))):
            Circle(SKETCH35_5_R)
        with Locations(Location((135.5, 6.5, 0), (0, 0, 270))):
            Circle(SKETCH35_5_R_2, mode=Mode.SUBTRACT)
    extrude(amount=-CUT_EXTRUDE36_DEPTH, mode=Mode.SUBTRACT)


with BuildPart() as cut_extrude36_piece_1:
    # of the separate pieces the step leaves, piece 1, a body of its own (cut_extrude36_pieces_kept)
    add(cut_extrude21_piece_2.part.solids().sort_by_distance((160, 67, 0))[0])

    # Sketch36 → Boss-Extrude17 (add)
    # profile 1 of 2: a face of its own
    with BuildSketch(Plane.XZ.offset(-70)):
        with Locations((74.426021402, -55.469089395)):
            Rectangle(SKETCH36_W, SKETCH36_H)
        with Locations(Location((74.426021402, -55.469089395, 0), (0, 0, 90))):
            Circle(SKETCH36_R, mode=Mode.SUBTRACT)
    # profile 2 of 2: a face of its own
    with BuildSketch(Plane.XZ.offset(-70)):
        with Locations((74.427115809, -35.736444324)):
            Rectangle(SKETCH36_W, SKETCH36_H)
        with Locations(Location((74.426021402, -35.469089395, 0), (0, 0, 90))):
            Circle(SKETCH36_R, mode=Mode.SUBTRACT)
    extrude(amount=BOSS_EXTRUDE17_DEPTH)

    # Sketch36<5> → Cut-Extrude38 (cut)
    with BuildSketch(Plane.XZ.offset(-70)):
        with Locations(Location((74.426021402, -55.469089395, 0), (0, 0, 90))):
            Circle(SKETCH36_5_R)
        with Locations(Location((74.426021402, -35.469089395, 0), (0, 0, 90))):
            Circle(SKETCH36_5_R)
    extrude(amount=CUT_EXTRUDE38_DEPTH, mode=Mode.SUBTRACT)


with BuildPart() as cut_extrude36_piece_2:
    # of the separate pieces the step leaves, piece 2, a body of its own (cut_extrude36_pieces_kept)
    add(cut_extrude21_piece_2.part.solids().sort_by_distance((54.5, 70, -4.4))[0])


with BuildPart() as cut_extrude36_piece_3:
    # of the separate pieces the step leaves, piece 3, a body of its own (cut_extrude36_pieces_kept)
    add(cut_extrude21_piece_2.part.solids().sort_by_distance((135.5, 70, -53.492077299))[0])


with BuildPart() as cut_extrude37_tool:
    # Sketch35<6> → Cut-Extrude37 (new, two sides: drawn at the far end of the back side and taken through both)
    with BuildSketch(Plane(origin=(0, 70, 0), x_dir=(1, 0, 0), z_dir=(0, 1, 0)).offset(-CUT_EXTRUDE37_DEPTH_BACK)):
        with Locations(Location((54.5, 6.5, 0), (0, 0, 270))):
            Circle(SKETCH35_6_R)
        with Locations(Location((54.5, 55.592077299, 0), (0, 0, 270))):
            Circle(SKETCH35_6_R)
        with Locations(Location((135.5, 55.592077299, 0), (0, 0, 270))):
            Circle(SKETCH35_6_R)
        with Locations(Location((135.5, 6.5, 0), (0, 0, 270))):
            Circle(SKETCH35_6_R)
    extrude(amount=CUT_EXTRUDE37_DEPTH + CUT_EXTRUDE37_DEPTH_BACK)


with BuildPart() as cut_extrude36_piece_2_1:
    add(cut_extrude36_piece_2.part)

    # Cut-Extrude37: cut by cut_extrude37_tool
    add(cut_extrude37_tool.part, mode=Mode.SUBTRACT)


with BuildPart() as cut_extrude36_piece_3_1:
    add(cut_extrude36_piece_3.part)

    # Cut-Extrude37: cut by cut_extrude37_tool
    add(cut_extrude37_tool.part, mode=Mode.SUBTRACT)


solid = cut_extrude36_piece_1.part
